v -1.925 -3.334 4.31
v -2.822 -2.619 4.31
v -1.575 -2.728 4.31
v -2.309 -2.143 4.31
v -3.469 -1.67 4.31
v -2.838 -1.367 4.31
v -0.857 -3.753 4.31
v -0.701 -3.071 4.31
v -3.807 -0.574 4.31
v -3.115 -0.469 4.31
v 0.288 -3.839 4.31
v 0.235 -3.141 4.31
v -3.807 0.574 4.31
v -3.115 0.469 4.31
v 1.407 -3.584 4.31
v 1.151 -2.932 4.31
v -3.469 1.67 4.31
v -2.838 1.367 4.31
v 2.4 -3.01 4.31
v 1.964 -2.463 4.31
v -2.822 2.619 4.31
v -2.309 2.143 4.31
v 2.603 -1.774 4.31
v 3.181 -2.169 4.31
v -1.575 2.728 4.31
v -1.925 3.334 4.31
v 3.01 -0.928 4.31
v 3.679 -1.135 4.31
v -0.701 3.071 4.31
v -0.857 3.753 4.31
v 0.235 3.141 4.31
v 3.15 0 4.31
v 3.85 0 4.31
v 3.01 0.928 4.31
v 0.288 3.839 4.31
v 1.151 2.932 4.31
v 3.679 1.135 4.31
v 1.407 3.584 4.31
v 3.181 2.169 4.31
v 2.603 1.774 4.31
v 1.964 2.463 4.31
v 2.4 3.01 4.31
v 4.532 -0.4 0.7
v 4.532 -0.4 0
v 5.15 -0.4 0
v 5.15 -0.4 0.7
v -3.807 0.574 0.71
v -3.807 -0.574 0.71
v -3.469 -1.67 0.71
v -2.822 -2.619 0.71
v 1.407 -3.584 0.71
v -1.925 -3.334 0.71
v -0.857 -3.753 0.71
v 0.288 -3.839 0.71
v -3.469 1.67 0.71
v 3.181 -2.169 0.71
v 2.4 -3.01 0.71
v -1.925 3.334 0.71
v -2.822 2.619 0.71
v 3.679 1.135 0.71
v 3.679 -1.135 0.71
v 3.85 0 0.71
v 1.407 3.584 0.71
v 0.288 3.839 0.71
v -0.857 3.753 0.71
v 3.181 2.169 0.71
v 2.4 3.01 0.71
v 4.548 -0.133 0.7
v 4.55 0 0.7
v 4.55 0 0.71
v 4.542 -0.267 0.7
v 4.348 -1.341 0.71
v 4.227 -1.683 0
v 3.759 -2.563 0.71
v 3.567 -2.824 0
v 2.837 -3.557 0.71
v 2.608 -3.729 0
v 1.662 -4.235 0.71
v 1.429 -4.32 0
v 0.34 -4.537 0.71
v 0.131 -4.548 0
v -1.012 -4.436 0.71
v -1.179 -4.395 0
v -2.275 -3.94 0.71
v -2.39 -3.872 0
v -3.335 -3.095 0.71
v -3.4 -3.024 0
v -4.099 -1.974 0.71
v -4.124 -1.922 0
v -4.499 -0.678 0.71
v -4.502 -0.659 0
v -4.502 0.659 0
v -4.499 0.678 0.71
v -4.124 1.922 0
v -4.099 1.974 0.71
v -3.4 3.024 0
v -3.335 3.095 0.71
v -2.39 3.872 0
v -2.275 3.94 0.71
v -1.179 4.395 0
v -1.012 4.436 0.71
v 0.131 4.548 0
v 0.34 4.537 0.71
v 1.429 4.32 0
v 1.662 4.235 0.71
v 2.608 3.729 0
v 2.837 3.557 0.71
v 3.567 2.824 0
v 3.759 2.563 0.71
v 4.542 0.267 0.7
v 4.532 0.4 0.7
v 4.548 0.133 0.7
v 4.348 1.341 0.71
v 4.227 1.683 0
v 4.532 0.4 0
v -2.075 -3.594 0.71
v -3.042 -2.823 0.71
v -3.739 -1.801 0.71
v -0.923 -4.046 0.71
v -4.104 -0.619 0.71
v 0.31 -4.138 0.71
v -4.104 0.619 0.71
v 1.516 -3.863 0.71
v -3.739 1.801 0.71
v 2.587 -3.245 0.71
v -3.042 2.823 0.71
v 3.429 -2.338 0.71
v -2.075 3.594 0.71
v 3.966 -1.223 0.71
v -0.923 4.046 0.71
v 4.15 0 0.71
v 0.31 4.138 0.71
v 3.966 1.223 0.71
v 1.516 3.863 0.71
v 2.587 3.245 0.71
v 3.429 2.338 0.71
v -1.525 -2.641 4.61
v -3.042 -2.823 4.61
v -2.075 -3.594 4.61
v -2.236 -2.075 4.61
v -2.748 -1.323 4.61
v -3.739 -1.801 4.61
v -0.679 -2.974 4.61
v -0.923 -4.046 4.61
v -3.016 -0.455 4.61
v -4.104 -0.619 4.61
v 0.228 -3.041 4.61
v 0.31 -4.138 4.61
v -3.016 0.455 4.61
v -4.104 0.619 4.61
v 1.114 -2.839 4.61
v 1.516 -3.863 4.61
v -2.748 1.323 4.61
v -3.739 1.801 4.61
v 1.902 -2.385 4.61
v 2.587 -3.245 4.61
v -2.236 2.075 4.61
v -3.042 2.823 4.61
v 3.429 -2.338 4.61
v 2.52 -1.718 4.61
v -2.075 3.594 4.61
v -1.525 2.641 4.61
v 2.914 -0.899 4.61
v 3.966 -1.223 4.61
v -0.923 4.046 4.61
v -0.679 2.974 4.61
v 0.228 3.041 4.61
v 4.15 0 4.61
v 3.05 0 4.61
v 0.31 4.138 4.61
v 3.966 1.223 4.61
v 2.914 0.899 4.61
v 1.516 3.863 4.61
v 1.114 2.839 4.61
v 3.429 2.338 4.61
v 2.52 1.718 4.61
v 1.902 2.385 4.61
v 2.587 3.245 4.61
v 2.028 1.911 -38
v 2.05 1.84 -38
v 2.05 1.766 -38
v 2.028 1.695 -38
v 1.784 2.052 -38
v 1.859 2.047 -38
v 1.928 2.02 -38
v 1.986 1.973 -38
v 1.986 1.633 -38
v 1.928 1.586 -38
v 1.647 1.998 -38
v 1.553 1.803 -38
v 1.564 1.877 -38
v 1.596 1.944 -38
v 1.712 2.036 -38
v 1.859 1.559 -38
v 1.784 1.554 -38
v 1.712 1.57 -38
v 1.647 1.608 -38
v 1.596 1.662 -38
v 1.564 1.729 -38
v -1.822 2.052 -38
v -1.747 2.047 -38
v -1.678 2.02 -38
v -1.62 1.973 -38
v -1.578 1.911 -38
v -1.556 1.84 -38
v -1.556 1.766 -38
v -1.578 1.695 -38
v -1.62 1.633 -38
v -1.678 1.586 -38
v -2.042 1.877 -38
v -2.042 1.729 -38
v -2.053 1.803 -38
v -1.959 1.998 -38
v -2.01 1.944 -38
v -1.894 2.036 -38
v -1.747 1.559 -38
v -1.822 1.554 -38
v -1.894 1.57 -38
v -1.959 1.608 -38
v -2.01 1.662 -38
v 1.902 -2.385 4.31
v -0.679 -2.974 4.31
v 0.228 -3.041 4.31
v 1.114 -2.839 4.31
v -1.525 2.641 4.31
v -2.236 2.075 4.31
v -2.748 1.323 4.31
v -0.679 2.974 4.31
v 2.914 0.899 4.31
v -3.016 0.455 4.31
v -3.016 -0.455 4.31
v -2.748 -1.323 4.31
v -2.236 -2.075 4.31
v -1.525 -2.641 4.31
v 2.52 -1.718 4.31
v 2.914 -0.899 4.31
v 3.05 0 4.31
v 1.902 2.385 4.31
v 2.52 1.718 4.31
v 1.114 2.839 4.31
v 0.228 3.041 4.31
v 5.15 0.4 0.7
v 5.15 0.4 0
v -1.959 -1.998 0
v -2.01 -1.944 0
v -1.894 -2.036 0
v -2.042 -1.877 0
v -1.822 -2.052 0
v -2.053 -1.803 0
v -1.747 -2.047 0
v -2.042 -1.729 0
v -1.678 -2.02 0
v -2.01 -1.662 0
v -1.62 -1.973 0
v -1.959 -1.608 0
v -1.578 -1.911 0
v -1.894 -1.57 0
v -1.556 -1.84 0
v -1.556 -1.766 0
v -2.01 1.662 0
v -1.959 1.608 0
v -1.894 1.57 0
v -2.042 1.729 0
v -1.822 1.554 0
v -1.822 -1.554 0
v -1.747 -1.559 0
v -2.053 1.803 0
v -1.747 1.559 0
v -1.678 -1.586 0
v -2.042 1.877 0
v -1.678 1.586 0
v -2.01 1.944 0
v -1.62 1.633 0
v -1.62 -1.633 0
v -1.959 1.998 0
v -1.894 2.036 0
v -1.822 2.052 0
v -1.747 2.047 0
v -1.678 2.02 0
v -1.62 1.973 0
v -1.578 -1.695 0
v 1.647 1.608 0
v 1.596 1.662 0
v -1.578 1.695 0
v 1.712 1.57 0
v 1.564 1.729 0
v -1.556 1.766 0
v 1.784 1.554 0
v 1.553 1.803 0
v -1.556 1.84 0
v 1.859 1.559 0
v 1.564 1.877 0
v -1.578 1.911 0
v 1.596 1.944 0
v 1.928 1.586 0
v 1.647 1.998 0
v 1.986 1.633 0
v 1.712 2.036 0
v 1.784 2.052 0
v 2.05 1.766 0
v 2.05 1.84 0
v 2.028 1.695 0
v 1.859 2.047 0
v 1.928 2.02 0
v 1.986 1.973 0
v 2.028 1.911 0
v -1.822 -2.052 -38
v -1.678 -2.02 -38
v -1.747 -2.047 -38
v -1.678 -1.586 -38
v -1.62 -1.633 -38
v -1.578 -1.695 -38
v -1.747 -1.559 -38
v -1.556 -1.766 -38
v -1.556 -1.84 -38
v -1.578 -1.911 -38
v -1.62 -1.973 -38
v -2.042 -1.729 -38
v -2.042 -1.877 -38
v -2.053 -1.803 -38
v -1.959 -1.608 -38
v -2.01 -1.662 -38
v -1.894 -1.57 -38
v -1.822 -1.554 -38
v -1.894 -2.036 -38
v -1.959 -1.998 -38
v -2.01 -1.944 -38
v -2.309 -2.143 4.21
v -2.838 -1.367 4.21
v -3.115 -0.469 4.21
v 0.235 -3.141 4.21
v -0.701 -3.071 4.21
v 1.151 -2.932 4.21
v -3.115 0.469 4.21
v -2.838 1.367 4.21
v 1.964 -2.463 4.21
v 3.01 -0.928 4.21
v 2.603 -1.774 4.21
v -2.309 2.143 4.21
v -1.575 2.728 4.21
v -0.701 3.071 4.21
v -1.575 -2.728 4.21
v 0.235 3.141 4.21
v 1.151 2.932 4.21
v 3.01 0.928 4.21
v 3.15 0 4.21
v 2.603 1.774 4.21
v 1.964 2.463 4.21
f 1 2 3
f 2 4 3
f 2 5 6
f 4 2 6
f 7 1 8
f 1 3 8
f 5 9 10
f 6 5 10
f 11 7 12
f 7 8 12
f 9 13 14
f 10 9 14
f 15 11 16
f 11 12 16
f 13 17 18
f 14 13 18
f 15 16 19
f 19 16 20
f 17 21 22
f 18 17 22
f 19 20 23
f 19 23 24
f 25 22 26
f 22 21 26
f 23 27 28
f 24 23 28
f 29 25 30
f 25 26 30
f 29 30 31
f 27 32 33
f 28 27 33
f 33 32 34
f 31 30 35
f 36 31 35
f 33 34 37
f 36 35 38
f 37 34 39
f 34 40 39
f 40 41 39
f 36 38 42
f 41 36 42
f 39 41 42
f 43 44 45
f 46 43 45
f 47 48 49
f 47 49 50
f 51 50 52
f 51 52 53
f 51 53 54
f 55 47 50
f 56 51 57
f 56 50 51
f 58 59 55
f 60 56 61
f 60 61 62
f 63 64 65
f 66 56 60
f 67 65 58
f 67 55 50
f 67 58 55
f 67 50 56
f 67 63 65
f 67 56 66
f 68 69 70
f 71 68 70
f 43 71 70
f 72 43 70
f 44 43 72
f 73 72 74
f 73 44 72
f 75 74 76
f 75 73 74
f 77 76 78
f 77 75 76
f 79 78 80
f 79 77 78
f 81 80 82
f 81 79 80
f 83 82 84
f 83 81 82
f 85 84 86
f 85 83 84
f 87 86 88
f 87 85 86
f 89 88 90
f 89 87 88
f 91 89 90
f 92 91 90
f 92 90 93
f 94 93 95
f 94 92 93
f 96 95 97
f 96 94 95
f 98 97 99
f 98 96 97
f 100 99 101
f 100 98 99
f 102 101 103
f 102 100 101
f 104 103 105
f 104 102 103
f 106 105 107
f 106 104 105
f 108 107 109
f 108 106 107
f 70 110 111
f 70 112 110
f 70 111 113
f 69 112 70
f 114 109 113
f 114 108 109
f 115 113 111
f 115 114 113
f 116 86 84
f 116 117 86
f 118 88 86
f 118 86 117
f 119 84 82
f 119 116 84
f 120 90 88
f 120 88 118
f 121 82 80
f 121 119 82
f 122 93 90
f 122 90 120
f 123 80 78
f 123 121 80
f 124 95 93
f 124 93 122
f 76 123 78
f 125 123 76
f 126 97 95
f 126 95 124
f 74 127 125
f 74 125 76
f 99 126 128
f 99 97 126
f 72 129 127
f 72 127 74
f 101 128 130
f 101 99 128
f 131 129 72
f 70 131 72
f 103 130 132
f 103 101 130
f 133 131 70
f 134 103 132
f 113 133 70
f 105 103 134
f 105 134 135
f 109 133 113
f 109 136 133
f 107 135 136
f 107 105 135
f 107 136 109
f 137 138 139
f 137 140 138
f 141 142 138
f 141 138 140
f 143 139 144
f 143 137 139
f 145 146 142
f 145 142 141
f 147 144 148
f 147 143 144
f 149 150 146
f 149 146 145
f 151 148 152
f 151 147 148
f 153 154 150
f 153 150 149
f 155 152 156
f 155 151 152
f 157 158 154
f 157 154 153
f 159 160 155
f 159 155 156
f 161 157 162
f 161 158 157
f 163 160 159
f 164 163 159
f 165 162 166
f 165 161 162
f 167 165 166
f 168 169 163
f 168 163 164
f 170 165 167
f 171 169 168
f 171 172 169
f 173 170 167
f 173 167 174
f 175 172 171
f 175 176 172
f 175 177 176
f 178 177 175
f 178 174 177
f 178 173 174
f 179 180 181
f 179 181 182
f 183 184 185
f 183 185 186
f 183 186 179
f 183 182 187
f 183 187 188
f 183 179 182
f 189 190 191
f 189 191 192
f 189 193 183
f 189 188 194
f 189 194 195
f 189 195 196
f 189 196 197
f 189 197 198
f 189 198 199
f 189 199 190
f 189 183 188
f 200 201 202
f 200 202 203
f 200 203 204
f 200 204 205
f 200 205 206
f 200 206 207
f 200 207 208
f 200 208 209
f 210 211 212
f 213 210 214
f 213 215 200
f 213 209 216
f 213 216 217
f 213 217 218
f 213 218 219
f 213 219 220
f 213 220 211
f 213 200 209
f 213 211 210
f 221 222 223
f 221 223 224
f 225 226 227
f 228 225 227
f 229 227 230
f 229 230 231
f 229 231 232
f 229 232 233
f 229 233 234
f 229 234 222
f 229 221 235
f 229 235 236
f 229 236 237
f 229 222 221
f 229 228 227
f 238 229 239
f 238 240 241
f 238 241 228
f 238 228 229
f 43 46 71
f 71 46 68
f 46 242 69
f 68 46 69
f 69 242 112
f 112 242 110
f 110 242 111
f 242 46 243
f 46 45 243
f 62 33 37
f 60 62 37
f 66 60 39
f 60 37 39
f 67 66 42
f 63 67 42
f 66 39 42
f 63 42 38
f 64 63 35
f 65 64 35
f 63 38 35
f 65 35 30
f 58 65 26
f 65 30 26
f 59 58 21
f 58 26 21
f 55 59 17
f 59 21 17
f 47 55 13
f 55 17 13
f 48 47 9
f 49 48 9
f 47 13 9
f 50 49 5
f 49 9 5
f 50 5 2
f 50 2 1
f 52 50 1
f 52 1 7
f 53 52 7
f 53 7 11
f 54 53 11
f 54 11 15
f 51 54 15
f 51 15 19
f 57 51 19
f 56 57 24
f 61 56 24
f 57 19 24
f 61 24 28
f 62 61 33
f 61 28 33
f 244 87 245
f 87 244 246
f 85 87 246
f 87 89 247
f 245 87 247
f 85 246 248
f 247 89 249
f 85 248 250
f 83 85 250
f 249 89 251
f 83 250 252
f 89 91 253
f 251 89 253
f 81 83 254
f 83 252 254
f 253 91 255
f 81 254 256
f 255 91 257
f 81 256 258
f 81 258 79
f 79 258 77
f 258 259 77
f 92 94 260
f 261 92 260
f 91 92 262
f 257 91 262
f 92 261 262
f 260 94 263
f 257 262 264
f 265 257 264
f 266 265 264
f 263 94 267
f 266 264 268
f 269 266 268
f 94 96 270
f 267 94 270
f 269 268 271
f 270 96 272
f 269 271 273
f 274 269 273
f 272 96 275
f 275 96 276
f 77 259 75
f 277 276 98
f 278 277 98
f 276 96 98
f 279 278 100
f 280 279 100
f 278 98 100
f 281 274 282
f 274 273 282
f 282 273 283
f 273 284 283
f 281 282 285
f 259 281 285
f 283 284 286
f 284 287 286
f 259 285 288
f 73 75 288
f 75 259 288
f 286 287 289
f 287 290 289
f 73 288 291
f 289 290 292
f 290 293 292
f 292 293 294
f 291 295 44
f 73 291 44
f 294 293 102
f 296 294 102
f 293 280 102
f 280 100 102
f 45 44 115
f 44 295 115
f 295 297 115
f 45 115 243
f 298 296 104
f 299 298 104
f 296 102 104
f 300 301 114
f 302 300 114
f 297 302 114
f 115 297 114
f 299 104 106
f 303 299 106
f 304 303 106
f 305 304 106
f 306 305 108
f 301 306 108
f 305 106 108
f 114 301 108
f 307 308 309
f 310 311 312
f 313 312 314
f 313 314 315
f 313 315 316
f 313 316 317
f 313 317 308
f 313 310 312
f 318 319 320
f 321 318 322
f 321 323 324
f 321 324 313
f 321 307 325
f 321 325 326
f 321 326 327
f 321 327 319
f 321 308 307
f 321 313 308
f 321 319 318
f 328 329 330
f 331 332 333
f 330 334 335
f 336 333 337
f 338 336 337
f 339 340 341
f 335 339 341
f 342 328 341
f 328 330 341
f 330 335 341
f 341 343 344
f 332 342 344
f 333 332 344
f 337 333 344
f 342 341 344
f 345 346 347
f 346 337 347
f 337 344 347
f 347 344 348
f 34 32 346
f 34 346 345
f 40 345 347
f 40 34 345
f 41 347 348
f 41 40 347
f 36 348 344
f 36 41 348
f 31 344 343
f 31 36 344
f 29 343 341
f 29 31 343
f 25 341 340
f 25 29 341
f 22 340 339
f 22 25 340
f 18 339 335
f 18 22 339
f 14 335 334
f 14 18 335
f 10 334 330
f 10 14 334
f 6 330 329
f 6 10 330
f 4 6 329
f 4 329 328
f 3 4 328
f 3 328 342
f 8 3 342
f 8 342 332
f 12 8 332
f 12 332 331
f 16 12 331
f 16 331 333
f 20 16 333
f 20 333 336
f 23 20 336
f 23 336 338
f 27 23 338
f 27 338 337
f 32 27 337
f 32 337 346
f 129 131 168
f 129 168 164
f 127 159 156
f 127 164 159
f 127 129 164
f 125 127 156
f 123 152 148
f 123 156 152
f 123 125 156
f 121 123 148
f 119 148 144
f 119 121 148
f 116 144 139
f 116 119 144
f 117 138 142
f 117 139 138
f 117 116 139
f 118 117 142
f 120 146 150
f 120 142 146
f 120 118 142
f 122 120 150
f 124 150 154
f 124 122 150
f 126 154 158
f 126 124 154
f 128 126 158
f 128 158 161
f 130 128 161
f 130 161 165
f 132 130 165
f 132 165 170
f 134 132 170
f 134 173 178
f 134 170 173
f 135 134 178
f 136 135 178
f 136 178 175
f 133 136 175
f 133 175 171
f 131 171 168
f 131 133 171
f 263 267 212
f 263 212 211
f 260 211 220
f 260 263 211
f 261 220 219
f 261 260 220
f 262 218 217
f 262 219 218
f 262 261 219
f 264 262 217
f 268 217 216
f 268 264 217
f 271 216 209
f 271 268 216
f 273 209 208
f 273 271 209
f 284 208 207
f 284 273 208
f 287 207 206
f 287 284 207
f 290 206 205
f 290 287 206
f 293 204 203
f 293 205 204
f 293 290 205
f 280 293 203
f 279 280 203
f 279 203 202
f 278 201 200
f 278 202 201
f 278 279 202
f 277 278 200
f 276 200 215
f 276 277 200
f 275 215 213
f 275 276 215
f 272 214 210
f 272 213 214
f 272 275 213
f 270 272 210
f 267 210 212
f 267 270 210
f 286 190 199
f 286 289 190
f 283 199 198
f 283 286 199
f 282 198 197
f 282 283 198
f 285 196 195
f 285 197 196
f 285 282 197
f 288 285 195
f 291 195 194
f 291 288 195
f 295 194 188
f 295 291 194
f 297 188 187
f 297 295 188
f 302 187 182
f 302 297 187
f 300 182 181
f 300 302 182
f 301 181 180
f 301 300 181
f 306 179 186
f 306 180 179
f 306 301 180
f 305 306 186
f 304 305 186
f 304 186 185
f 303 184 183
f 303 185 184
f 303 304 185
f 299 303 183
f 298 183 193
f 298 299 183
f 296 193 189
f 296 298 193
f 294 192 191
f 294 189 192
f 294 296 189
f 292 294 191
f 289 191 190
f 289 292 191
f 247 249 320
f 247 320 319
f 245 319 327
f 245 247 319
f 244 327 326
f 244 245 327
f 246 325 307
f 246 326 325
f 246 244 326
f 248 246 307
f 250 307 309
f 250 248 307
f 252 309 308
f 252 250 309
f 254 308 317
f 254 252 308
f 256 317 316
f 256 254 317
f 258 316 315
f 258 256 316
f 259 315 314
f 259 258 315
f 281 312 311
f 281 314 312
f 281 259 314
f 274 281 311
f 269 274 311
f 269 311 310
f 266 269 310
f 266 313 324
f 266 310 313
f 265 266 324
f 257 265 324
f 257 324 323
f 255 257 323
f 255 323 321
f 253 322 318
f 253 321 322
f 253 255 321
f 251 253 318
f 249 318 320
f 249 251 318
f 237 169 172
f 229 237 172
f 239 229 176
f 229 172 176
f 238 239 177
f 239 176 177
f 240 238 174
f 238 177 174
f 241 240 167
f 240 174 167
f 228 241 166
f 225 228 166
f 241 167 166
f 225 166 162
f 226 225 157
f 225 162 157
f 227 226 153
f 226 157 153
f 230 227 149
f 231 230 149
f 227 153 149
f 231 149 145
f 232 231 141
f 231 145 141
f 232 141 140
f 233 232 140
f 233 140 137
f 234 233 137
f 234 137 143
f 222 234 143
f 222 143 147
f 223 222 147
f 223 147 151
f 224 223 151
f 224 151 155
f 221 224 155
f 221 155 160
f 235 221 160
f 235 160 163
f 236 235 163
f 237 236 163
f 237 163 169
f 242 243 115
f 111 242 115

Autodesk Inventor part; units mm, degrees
ref_plane "YZ Plane" through (0, 0, 0) normal (1, 0, 0) x (0, 1, 0)
ref_plane "XZ Plane" through (0, 0, 0) normal (0, 1, 0) x (-1, 0, 0)
ref_plane "XY Plane" through (0, 0, 0) normal (0, 0, 1) x (1, 0, 0)
sketch "Sketch1" plane through (0, 0, 0) normal (0, 0, 1) x (1, 0, 0)
  circle A0 centre (0, 0) radius 4.55
  dimension "d0" = 9.1
extrude "Base" add sketch "Sketch1" along normal blind 0.71
sketch "Sketch2" plane through (0, 0, 0.71) normal (0, 0, 1) x (1, 0, 0)
  circle A0 centre (0, 0) radius 4.15
  dimension "d3" = 8.3
extrude "Can: Outer Wall" add sketch "Sketch2" along normal blind 3.9
sketch "Sketch3" plane through (0, 0, 4.61) normal (0, 0, 1) x (1, 0, 0)
  circle A0 centre (0, 0) radius 3.85
  dimension "d6" = 7.7
extrude "Can: Inner Wall" cut sketch "Sketch3" against normal blind 3.9
sketch "Sketch4" plane through (0, 0, 4.61) normal (0, 0, 1) x (1, 0, 0)
  circle A0 centre (0, 0) radius 3.85
  dimension "d9" = 7.7
extrude "Can: Top" add sketch "Sketch4" against normal blind 0.3
sketch "Sketch5" plane through (0, 0, 4.61) normal (0, 0, 1) x (1, 0, 0)
  circle A0 centre (0, 0) radius 3.05
  dimension "d12" = 6.1
extrude "Can: Hole" cut sketch "Sketch5" against normal blind 0.3
ref_plane "Work Plane1" through (0, 0, 4.31) normal (0, 0, 1) x (1, 0, 0)
sketch "Sketch8" plane through (0, 0, 4.31) normal (0, 0, 1) x (1, 0, 0)
  circle A0 centre (0, 0) radius 3.15
  dimension "d16" = 6.3
extrude "Window" add sketch "Sketch8" against normal blind 0.1
sketch "Sketch9" plane through (0, 0, 0) normal (0, 0, -1) x (-1, 0, 0)
  line L0 (0, -0.4) -> (-5.15, -0.4)
  line L1 (-5.15, -0.4) -> (-5.15, 0.4)
  line L2 (-5.15, 0.4) -> (0, 0.4)
  line L3 (0, 0.4) -> (0, -0.4)
  point P0 (0, 0)
  dimension "d19" = 5.15
  dimension "d20" = 0.8
extrude "Key" add sketch "Sketch9" against normal blind 0.7
sketch "Sketch10" plane through (0, 0, 0) normal (0, 0, -1) x (-1, 0, 0)
  circle A0 centre (-1.803, 1.803) radius 0.25
  point P0 (0, 0)
  dimension "d23" = 0.5
extrude "Pin 1" add sketch "Sketch10" along normal blind 38
sketch "Sketch11" plane through (0, 0, 0) normal (0, 0, -1) x (-1, 0, 0)
  circle A0 centre (1.803, 1.803) radius 0.25
  point P0 (0, 0)
  dimension "d26" = 0.5
extrude "Pin 2" add sketch "Sketch11" along normal blind 38
sketch "Sketch12" plane through (0, 0, 0) normal (0, 0, -1) x (-1, 0, 0)
  circle A0 centre (1.803, -1.803) radius 0.25
  point P0 (0, 0)
  dimension "d29" = 0.5
extrude "Pin 3" add sketch "Sketch12" along normal blind 38
properties part number "Thorlabs_FDS010" material "Gold"
